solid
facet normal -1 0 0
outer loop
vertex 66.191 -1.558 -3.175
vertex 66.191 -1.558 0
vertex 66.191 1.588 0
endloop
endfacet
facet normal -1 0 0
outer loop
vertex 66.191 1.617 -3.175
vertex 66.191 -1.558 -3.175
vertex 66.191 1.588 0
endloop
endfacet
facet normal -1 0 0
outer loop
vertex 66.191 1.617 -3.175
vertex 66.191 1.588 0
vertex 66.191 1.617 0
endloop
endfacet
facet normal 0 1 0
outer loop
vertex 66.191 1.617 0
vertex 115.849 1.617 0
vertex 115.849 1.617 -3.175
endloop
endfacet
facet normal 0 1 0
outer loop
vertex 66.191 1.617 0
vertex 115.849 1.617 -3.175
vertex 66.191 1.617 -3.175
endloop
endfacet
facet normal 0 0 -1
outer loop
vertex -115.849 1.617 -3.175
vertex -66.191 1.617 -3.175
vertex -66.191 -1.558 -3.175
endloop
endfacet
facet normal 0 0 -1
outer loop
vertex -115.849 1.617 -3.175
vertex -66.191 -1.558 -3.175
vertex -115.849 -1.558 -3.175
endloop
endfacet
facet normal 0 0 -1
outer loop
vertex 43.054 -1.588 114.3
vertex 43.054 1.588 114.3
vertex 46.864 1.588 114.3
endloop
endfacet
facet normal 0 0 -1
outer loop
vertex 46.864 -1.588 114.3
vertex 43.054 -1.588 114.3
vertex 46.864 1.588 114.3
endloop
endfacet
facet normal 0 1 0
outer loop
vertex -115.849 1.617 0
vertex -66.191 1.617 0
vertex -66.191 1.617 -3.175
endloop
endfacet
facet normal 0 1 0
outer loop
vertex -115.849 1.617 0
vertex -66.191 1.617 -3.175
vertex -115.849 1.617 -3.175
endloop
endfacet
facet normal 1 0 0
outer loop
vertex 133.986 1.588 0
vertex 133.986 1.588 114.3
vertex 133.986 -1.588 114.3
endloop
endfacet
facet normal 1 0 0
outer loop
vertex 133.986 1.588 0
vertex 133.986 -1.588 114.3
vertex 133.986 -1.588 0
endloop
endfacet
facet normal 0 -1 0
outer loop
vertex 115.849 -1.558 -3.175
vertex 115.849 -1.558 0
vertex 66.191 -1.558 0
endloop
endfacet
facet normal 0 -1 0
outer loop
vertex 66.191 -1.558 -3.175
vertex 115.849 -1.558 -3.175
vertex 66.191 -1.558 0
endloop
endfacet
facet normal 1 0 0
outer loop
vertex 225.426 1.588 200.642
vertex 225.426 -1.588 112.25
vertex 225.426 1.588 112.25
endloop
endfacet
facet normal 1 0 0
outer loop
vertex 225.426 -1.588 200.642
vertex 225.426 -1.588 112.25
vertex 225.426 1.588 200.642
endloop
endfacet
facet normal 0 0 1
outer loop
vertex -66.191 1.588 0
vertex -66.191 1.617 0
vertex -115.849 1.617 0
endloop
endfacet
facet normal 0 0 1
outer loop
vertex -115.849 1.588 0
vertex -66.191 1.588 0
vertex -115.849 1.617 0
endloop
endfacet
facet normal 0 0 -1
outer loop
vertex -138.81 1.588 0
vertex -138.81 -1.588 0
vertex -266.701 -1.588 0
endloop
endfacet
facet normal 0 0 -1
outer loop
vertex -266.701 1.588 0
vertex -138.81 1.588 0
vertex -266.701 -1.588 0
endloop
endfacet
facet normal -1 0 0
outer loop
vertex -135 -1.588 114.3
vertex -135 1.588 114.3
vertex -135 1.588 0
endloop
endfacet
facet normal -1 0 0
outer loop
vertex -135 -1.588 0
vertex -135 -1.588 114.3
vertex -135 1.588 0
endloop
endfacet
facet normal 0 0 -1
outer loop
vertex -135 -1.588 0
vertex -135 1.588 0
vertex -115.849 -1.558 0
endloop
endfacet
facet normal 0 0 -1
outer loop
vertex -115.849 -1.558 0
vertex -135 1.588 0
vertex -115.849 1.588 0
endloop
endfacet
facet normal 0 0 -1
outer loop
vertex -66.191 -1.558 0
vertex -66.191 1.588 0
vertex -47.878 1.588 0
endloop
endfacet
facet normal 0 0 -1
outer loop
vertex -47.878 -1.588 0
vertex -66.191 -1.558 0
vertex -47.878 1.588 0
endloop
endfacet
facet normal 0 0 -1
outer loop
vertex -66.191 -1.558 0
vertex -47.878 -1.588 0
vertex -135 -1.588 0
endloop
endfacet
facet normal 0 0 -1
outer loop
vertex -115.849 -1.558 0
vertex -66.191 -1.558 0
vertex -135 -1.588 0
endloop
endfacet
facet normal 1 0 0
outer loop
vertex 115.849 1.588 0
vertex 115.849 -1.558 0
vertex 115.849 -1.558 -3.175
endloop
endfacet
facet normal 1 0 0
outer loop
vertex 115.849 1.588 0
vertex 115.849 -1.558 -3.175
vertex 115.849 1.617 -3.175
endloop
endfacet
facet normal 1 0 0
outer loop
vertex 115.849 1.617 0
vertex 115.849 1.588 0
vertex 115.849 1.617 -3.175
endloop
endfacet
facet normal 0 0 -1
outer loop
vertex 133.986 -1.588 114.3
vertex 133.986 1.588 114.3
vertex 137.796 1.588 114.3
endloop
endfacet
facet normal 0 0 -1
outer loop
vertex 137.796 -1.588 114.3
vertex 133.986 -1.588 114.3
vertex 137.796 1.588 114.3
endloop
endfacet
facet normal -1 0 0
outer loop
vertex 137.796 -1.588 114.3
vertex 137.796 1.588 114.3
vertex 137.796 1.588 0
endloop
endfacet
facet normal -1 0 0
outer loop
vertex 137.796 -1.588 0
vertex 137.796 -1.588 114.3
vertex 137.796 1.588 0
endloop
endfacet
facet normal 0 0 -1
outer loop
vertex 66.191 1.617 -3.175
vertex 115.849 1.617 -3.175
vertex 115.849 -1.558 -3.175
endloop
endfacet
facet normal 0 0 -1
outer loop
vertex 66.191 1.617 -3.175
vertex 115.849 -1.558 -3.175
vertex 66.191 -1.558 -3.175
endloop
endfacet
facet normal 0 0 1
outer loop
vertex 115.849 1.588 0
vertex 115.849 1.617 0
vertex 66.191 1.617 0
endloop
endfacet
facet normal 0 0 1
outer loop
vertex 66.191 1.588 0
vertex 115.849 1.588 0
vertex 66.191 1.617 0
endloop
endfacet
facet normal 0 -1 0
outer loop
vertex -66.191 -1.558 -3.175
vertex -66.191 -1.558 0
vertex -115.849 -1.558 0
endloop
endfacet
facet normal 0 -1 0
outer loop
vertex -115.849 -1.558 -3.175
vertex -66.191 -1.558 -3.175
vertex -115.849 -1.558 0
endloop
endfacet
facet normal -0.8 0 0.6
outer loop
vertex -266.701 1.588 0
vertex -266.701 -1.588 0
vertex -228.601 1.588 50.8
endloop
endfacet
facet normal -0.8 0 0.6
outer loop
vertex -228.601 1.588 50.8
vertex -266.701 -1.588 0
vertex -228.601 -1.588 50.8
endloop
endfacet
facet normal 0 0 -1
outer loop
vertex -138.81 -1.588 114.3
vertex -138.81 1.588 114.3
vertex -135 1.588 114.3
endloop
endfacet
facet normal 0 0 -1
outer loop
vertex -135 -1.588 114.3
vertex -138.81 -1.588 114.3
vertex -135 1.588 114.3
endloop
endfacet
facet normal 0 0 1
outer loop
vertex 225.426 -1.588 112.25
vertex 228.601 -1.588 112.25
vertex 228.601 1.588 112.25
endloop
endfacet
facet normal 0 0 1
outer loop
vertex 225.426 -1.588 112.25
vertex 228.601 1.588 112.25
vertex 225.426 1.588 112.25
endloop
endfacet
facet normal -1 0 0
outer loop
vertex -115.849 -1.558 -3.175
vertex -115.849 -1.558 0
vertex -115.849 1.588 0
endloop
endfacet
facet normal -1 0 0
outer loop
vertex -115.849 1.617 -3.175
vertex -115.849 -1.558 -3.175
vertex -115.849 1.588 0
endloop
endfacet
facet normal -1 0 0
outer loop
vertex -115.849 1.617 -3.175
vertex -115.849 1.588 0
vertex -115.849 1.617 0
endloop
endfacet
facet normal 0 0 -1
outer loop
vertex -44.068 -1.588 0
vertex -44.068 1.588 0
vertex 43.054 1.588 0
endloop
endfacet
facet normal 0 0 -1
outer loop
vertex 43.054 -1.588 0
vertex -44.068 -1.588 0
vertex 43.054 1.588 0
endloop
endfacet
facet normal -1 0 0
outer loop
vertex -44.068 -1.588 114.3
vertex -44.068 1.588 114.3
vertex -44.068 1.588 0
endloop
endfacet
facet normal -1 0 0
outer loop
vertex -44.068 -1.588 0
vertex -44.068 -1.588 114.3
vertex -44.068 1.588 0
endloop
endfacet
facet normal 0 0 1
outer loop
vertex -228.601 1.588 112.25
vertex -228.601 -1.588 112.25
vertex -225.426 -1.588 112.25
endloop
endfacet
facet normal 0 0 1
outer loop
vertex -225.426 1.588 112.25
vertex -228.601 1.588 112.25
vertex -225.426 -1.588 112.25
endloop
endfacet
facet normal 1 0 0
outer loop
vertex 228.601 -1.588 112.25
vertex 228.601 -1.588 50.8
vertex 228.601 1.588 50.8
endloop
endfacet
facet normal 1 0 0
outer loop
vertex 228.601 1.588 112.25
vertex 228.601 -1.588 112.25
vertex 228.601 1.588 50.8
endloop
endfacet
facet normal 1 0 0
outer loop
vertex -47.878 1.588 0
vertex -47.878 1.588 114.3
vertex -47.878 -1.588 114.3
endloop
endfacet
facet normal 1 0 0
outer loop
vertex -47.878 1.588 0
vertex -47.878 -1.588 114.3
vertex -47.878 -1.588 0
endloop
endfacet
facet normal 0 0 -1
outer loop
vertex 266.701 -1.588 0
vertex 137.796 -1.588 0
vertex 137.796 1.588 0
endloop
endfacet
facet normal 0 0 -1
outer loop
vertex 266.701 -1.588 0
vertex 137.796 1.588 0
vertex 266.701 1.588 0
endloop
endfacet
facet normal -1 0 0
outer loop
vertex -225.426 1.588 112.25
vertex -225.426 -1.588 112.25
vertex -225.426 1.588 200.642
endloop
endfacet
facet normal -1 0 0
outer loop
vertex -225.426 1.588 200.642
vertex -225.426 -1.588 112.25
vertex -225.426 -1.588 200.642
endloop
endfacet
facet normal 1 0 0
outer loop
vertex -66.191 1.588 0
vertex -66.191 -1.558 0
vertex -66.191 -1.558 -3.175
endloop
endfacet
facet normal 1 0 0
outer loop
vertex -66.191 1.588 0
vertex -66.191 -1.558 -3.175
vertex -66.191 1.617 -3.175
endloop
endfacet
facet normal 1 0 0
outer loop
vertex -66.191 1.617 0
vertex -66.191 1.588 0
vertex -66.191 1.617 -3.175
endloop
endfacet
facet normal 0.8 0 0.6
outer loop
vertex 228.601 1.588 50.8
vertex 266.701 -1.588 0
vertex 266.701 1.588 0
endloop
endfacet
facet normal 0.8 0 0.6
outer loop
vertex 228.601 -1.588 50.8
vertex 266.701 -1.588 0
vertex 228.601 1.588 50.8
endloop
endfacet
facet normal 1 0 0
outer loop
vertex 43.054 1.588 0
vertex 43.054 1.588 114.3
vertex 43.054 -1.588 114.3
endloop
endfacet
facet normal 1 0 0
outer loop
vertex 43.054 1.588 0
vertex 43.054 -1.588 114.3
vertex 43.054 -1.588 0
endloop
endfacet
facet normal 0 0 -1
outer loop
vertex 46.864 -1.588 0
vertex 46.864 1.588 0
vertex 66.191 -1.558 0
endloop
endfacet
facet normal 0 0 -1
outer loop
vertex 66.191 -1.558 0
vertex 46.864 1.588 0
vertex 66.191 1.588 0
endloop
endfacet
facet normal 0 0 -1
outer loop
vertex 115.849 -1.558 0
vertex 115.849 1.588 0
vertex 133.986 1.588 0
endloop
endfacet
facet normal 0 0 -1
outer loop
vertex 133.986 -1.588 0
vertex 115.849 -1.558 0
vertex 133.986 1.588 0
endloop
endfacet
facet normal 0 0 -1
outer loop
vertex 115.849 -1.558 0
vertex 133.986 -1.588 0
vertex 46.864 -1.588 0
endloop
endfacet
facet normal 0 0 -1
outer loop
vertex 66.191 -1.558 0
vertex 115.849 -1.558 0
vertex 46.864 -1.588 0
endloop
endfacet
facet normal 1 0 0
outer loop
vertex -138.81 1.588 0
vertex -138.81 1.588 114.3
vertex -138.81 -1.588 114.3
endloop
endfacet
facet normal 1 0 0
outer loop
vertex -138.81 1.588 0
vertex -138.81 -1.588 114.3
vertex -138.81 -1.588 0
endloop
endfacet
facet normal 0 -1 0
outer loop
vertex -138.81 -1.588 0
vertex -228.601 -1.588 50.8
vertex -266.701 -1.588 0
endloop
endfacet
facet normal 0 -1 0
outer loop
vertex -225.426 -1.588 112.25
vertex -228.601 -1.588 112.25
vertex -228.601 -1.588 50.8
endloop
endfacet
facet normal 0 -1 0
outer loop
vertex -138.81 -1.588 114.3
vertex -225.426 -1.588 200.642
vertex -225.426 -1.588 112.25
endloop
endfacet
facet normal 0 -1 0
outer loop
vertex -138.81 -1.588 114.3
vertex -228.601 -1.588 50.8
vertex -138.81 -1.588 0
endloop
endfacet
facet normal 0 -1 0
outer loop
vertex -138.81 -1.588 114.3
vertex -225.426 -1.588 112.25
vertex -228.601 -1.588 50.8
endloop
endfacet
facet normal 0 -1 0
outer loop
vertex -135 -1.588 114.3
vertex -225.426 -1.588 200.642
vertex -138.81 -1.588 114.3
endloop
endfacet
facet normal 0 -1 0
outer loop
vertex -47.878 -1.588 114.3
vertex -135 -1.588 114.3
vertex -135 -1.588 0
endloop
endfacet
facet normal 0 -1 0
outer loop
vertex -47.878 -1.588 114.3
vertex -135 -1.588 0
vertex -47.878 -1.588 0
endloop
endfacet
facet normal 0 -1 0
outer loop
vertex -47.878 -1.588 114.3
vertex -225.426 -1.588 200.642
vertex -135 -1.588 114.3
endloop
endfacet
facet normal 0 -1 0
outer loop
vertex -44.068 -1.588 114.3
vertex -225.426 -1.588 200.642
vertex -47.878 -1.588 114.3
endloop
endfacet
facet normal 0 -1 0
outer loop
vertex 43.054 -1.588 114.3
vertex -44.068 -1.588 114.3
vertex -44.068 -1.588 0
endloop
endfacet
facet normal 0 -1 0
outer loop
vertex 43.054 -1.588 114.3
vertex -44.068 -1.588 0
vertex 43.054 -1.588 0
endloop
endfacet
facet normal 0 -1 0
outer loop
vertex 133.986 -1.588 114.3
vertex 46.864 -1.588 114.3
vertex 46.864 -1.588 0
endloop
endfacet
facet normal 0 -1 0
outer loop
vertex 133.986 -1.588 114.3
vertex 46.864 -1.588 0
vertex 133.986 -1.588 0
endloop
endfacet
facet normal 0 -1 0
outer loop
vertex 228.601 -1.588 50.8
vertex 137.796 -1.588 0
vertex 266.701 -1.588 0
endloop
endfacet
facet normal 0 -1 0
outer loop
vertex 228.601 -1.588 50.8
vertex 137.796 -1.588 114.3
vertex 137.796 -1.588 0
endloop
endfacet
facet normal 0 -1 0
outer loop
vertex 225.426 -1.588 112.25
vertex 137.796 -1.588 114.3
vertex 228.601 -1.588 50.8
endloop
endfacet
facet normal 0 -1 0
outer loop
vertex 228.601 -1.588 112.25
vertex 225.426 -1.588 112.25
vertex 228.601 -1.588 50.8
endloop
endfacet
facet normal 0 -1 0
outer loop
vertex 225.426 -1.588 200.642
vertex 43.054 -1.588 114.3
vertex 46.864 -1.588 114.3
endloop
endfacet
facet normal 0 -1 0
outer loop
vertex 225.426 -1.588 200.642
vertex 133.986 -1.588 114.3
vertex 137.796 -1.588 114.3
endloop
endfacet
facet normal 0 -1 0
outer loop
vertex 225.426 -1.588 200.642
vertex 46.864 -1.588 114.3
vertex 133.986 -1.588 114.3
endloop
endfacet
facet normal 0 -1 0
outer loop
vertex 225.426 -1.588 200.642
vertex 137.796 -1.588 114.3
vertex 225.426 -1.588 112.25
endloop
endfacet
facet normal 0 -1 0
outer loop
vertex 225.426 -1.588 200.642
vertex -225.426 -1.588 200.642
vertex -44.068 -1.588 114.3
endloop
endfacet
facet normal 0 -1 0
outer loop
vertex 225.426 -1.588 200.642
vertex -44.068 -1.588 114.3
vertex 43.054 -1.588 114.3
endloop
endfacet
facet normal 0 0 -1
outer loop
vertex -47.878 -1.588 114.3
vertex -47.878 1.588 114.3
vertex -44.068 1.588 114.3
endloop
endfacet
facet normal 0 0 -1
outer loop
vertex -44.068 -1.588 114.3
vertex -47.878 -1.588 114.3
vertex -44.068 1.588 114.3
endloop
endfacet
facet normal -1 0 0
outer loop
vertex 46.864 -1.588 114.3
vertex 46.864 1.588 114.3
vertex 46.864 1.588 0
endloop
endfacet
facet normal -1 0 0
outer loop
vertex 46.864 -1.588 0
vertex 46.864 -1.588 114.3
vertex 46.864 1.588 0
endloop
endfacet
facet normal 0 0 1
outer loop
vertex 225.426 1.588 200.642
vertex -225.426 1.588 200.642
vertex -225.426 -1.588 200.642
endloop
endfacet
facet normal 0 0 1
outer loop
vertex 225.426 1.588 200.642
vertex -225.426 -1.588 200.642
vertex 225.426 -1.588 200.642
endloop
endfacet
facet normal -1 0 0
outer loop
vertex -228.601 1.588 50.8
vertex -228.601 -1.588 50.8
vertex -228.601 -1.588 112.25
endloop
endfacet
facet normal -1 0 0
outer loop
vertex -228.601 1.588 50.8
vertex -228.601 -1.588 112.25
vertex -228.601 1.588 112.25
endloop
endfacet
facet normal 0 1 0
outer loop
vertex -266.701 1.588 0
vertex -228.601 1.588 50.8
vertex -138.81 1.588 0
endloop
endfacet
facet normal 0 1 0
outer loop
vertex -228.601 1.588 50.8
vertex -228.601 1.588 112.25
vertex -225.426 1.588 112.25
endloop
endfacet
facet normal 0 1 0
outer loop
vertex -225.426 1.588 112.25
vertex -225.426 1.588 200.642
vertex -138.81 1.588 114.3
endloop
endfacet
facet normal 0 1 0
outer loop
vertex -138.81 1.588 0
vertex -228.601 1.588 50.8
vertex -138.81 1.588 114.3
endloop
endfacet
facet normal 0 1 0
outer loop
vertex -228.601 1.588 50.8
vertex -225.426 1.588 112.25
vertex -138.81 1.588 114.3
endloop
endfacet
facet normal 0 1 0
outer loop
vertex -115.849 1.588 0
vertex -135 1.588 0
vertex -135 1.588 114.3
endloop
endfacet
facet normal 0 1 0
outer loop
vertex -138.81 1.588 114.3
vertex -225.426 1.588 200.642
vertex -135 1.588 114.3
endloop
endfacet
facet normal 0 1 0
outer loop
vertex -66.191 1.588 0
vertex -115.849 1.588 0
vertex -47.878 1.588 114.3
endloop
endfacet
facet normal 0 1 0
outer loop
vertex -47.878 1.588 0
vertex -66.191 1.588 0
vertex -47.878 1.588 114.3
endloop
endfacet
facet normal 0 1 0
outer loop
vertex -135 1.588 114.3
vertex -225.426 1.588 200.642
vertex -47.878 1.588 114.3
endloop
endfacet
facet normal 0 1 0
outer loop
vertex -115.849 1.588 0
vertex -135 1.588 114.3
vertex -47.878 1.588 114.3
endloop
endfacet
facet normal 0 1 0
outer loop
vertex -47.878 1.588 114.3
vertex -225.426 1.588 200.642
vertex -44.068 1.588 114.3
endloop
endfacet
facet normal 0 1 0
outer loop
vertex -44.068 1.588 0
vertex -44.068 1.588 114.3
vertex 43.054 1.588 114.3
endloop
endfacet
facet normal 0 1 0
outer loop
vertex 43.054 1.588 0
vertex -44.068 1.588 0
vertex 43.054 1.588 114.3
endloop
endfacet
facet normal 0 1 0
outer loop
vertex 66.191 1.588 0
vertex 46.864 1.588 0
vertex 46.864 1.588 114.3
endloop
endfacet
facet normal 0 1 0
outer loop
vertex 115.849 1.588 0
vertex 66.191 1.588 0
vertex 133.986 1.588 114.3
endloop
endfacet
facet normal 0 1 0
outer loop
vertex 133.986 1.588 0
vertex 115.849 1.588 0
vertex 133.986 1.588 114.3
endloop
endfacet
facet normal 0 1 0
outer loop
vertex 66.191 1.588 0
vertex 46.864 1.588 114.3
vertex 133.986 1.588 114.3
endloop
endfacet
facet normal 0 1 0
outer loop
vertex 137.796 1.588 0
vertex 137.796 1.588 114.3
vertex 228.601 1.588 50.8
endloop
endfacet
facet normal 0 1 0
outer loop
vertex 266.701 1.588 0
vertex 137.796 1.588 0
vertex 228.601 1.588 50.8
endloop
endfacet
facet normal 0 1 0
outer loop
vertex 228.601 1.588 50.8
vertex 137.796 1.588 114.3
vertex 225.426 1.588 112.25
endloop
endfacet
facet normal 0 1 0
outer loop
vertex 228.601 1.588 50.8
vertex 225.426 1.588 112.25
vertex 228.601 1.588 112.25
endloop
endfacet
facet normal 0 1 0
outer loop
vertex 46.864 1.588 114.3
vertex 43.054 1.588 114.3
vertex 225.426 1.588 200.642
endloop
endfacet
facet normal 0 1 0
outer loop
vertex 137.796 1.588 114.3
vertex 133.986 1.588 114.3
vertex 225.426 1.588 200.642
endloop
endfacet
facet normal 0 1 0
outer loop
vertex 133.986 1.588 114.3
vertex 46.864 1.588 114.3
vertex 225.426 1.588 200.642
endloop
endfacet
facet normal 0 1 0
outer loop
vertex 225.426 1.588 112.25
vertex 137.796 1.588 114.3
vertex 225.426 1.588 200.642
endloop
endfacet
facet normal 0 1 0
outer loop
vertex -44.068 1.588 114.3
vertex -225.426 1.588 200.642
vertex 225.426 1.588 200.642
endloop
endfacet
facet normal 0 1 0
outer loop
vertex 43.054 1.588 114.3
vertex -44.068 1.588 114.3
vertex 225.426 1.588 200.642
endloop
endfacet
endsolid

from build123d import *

# Parameters (mm, degrees)
SKETCH1_W           = 457.2020066
SKETCH1_H           = 3.175
BOSS_EXTRUDE1_DEPTH = 200.6419914
SKETCH2_W           = 3.81
SKETCH2_H           = 114.3
CUT_EXTRUDE1_DEPTH  = 305.180387349
LPATTERN1_COUNT     = 4
LPATTERN1_PITCH     = 90.932
BOSS_EXTRUDE3_DEPTH = 3.175
SKETCH5_W           = 3.175
SKETCH5_H           = 88.392
CUT_EXTRUDE2_DEPTH  = 3.175
SKETCH3_W           = 49.658811606
SKETCH3_H           = 3.175
BOSS_EXTRUDE4_DEPTH = 3.175


with BuildPart() as part:
    # Sketch1 → Boss-Extrude1 (new body)
    with BuildSketch(Plane.XY):
        Rectangle(SKETCH1_W, SKETCH1_H)
    extrude(amount=BOSS_EXTRUDE1_DEPTH)

    # Sketch2 → Cut-Extrude1 (cut, through all)
    with BuildSketch(Plane(origin=(0, 1.5875, 0), x_dir=(1, 0, 0), z_dir=(0, 1, 0))):
        with Locations((135.8910033, -57.15)):
            Rectangle(SKETCH2_W, SKETCH2_H)
    cut_extrude1 = extrude(amount=-CUT_EXTRUDE1_DEPTH, mode=Mode.SUBTRACT)

    # LPattern1: Cut-Extrude1 ×4
    with Locations(*[(-i * LPATTERN1_PITCH, 0, 0) for i in range(1, LPATTERN1_COUNT)]):
        add(cut_extrude1, mode=Mode.SUBTRACT)

    # Sketch4 → Boss-Extrude3 (add)
    with BuildSketch(Plane.XZ.offset(1.5875)):
        Polygon((-228.6010033, 0), (-266.7010033, 0), (-228.6010033, 50.8), align=None)
    boss_extrude3 = extrude(amount=-BOSS_EXTRUDE3_DEPTH)

    # Mirror1: Boss-Extrude3 across plane
    add(boss_extrude3.mirror(Plane(origin=(0, 0, 0), x_dir=(0, 0, 1), z_dir=(1, 0, 0))))

    # Sketch5 → Cut-Extrude2 (cut)
    with BuildSketch(Plane.XZ.offset(1.5875)):
        with Locations((-227.0135033, 156.4459914)):
            Rectangle(SKETCH5_W, SKETCH5_H)
    cut_extrude2 = extrude(amount=-CUT_EXTRUDE2_DEPTH, mode=Mode.SUBTRACT)

    # Mirror2: Cut-Extrude2 across plane
    add(cut_extrude2.mirror(Plane(origin=(0, 0, 0), x_dir=(0, 0, 1), z_dir=(1, 0, 0))), mode=Mode.SUBTRACT)

    # Sketch3 → Boss-Extrude4 (add)
    with BuildSketch(Plane(origin=(0, 0, 0), x_dir=(-1, 0, 0), z_dir=(0, 0, -1))):
        with Locations((-91.020094169, 0.029240406)):
            Rectangle(SKETCH3_W, SKETCH3_H)
        with Locations((91.020094169, 0.029240406)):
            Rectangle(SKETCH3_W, SKETCH3_H)
    extrude(amount=BOSS_EXTRUDE4_DEPTH)


solid = part.part
